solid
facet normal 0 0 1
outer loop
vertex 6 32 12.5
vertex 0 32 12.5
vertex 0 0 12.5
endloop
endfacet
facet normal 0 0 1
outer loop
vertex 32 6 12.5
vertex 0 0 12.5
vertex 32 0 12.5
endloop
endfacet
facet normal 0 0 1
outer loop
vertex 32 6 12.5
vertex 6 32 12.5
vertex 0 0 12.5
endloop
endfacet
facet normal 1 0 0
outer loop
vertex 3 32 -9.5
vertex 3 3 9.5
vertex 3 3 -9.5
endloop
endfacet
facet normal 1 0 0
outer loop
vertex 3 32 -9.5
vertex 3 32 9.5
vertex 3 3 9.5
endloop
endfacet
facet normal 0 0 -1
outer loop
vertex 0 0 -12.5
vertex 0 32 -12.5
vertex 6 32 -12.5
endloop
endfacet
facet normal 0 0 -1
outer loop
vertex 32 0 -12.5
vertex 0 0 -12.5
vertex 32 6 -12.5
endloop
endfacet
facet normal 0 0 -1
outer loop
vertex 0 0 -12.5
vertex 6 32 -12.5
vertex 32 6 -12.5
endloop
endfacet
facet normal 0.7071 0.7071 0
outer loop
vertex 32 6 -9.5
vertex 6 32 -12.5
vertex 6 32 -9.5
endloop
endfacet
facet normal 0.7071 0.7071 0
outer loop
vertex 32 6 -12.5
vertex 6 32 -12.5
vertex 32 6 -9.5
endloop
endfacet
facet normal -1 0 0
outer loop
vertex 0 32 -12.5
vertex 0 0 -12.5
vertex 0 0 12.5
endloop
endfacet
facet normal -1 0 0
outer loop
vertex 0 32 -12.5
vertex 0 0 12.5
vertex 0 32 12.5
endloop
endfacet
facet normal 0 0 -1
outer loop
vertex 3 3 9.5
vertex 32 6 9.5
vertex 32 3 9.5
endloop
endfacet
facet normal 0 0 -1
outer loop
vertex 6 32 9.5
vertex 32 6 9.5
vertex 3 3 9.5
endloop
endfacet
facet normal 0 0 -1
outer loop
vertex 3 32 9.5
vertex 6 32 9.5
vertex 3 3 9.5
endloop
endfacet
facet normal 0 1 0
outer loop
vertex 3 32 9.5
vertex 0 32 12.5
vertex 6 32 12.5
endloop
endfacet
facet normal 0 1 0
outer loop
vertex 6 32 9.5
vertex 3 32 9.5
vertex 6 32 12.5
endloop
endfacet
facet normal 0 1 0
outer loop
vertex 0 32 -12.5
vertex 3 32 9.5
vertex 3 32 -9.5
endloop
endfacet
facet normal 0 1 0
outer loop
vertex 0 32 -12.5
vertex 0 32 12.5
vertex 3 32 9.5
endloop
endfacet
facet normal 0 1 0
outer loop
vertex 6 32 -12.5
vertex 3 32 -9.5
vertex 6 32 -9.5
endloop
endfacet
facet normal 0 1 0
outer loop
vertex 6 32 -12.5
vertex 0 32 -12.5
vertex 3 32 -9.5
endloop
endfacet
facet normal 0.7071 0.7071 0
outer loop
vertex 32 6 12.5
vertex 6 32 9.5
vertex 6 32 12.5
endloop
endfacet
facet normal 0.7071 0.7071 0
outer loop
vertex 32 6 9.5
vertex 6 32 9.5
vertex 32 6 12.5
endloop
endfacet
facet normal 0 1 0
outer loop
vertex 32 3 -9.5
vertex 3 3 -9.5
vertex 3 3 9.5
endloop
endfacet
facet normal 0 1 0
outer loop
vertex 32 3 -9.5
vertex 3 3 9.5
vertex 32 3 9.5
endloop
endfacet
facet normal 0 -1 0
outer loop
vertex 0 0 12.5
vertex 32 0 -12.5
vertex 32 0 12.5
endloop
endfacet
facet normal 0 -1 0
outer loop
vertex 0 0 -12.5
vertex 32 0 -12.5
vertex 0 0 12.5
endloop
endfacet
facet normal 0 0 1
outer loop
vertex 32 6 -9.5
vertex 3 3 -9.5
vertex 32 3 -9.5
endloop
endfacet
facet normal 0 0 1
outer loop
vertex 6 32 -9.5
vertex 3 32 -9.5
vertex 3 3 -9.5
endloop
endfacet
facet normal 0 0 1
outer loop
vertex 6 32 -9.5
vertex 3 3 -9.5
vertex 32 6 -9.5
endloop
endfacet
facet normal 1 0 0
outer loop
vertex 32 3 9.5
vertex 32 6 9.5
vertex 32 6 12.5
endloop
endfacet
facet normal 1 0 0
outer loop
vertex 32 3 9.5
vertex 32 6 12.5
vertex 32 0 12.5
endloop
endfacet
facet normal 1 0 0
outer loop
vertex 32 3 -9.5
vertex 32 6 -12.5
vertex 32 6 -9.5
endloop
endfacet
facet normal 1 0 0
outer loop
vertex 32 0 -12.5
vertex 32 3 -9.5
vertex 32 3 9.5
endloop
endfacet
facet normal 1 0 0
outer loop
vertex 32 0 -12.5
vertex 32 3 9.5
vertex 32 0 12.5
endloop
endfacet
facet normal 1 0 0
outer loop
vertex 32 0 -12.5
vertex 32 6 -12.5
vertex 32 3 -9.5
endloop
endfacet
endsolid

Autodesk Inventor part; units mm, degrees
ref_plane "YZ Plane" through (0, 0, 0) normal (1, 0, 0) x (0, 1, 0)
ref_plane "XZ Plane" through (0, 0, 0) normal (0, 1, 0) x (-1, 0, 0)
ref_plane "XY Plane" through (0, 0, 0) normal (0, 0, 1) x (1, 0, 0)
sketch "Sketch1" plane through (0, 0, 0) normal (0, 0, 1) x (1, 0, 0)
  line L0 (0, 0) -> (0, 32)
  line L1 (0, 32) -> (6, 32)
  line L2 (6, 32) -> (32, 6)
  line L3 (32, 6) -> (32, 0)
  line L4 (32, 0) -> (0, 0)
  dimension "d0" = 32
  dimension "d1" = 6
extrude "Extrusion1" add sketch "Sketch1" along normal mid plane 25
sketch "Sketch2" plane through (0, 32, 12.5) normal (0, 1, 0) x (1, 0, 0)
  line L0 (0, 0) -> (0, 25) projected
  line L1 (6, 0) -> (0, 0) projected
  line L2 (0, 25) -> (6, 25) projected
  line L3 (3, 22) -> (32, 22)
  line L4 (32, 22) -> (32, 3)
  line L5 (32, 3) -> (3, 3)
  line L6 (3, 3) -> (3, 22)
  line L7 (32, 0) -> (32, 25) projected
  point P0 (0, 12.5)
  dimension "d4" = 3
  dimension "d5" = 3
  dimension "d6" = 3
extrude "Extrusion2" cut sketch "Sketch2" against normal blind 29
equation "\"d5\" = d4"
equation "\"d6\" = d4"
properties part number "CornerBracket"
